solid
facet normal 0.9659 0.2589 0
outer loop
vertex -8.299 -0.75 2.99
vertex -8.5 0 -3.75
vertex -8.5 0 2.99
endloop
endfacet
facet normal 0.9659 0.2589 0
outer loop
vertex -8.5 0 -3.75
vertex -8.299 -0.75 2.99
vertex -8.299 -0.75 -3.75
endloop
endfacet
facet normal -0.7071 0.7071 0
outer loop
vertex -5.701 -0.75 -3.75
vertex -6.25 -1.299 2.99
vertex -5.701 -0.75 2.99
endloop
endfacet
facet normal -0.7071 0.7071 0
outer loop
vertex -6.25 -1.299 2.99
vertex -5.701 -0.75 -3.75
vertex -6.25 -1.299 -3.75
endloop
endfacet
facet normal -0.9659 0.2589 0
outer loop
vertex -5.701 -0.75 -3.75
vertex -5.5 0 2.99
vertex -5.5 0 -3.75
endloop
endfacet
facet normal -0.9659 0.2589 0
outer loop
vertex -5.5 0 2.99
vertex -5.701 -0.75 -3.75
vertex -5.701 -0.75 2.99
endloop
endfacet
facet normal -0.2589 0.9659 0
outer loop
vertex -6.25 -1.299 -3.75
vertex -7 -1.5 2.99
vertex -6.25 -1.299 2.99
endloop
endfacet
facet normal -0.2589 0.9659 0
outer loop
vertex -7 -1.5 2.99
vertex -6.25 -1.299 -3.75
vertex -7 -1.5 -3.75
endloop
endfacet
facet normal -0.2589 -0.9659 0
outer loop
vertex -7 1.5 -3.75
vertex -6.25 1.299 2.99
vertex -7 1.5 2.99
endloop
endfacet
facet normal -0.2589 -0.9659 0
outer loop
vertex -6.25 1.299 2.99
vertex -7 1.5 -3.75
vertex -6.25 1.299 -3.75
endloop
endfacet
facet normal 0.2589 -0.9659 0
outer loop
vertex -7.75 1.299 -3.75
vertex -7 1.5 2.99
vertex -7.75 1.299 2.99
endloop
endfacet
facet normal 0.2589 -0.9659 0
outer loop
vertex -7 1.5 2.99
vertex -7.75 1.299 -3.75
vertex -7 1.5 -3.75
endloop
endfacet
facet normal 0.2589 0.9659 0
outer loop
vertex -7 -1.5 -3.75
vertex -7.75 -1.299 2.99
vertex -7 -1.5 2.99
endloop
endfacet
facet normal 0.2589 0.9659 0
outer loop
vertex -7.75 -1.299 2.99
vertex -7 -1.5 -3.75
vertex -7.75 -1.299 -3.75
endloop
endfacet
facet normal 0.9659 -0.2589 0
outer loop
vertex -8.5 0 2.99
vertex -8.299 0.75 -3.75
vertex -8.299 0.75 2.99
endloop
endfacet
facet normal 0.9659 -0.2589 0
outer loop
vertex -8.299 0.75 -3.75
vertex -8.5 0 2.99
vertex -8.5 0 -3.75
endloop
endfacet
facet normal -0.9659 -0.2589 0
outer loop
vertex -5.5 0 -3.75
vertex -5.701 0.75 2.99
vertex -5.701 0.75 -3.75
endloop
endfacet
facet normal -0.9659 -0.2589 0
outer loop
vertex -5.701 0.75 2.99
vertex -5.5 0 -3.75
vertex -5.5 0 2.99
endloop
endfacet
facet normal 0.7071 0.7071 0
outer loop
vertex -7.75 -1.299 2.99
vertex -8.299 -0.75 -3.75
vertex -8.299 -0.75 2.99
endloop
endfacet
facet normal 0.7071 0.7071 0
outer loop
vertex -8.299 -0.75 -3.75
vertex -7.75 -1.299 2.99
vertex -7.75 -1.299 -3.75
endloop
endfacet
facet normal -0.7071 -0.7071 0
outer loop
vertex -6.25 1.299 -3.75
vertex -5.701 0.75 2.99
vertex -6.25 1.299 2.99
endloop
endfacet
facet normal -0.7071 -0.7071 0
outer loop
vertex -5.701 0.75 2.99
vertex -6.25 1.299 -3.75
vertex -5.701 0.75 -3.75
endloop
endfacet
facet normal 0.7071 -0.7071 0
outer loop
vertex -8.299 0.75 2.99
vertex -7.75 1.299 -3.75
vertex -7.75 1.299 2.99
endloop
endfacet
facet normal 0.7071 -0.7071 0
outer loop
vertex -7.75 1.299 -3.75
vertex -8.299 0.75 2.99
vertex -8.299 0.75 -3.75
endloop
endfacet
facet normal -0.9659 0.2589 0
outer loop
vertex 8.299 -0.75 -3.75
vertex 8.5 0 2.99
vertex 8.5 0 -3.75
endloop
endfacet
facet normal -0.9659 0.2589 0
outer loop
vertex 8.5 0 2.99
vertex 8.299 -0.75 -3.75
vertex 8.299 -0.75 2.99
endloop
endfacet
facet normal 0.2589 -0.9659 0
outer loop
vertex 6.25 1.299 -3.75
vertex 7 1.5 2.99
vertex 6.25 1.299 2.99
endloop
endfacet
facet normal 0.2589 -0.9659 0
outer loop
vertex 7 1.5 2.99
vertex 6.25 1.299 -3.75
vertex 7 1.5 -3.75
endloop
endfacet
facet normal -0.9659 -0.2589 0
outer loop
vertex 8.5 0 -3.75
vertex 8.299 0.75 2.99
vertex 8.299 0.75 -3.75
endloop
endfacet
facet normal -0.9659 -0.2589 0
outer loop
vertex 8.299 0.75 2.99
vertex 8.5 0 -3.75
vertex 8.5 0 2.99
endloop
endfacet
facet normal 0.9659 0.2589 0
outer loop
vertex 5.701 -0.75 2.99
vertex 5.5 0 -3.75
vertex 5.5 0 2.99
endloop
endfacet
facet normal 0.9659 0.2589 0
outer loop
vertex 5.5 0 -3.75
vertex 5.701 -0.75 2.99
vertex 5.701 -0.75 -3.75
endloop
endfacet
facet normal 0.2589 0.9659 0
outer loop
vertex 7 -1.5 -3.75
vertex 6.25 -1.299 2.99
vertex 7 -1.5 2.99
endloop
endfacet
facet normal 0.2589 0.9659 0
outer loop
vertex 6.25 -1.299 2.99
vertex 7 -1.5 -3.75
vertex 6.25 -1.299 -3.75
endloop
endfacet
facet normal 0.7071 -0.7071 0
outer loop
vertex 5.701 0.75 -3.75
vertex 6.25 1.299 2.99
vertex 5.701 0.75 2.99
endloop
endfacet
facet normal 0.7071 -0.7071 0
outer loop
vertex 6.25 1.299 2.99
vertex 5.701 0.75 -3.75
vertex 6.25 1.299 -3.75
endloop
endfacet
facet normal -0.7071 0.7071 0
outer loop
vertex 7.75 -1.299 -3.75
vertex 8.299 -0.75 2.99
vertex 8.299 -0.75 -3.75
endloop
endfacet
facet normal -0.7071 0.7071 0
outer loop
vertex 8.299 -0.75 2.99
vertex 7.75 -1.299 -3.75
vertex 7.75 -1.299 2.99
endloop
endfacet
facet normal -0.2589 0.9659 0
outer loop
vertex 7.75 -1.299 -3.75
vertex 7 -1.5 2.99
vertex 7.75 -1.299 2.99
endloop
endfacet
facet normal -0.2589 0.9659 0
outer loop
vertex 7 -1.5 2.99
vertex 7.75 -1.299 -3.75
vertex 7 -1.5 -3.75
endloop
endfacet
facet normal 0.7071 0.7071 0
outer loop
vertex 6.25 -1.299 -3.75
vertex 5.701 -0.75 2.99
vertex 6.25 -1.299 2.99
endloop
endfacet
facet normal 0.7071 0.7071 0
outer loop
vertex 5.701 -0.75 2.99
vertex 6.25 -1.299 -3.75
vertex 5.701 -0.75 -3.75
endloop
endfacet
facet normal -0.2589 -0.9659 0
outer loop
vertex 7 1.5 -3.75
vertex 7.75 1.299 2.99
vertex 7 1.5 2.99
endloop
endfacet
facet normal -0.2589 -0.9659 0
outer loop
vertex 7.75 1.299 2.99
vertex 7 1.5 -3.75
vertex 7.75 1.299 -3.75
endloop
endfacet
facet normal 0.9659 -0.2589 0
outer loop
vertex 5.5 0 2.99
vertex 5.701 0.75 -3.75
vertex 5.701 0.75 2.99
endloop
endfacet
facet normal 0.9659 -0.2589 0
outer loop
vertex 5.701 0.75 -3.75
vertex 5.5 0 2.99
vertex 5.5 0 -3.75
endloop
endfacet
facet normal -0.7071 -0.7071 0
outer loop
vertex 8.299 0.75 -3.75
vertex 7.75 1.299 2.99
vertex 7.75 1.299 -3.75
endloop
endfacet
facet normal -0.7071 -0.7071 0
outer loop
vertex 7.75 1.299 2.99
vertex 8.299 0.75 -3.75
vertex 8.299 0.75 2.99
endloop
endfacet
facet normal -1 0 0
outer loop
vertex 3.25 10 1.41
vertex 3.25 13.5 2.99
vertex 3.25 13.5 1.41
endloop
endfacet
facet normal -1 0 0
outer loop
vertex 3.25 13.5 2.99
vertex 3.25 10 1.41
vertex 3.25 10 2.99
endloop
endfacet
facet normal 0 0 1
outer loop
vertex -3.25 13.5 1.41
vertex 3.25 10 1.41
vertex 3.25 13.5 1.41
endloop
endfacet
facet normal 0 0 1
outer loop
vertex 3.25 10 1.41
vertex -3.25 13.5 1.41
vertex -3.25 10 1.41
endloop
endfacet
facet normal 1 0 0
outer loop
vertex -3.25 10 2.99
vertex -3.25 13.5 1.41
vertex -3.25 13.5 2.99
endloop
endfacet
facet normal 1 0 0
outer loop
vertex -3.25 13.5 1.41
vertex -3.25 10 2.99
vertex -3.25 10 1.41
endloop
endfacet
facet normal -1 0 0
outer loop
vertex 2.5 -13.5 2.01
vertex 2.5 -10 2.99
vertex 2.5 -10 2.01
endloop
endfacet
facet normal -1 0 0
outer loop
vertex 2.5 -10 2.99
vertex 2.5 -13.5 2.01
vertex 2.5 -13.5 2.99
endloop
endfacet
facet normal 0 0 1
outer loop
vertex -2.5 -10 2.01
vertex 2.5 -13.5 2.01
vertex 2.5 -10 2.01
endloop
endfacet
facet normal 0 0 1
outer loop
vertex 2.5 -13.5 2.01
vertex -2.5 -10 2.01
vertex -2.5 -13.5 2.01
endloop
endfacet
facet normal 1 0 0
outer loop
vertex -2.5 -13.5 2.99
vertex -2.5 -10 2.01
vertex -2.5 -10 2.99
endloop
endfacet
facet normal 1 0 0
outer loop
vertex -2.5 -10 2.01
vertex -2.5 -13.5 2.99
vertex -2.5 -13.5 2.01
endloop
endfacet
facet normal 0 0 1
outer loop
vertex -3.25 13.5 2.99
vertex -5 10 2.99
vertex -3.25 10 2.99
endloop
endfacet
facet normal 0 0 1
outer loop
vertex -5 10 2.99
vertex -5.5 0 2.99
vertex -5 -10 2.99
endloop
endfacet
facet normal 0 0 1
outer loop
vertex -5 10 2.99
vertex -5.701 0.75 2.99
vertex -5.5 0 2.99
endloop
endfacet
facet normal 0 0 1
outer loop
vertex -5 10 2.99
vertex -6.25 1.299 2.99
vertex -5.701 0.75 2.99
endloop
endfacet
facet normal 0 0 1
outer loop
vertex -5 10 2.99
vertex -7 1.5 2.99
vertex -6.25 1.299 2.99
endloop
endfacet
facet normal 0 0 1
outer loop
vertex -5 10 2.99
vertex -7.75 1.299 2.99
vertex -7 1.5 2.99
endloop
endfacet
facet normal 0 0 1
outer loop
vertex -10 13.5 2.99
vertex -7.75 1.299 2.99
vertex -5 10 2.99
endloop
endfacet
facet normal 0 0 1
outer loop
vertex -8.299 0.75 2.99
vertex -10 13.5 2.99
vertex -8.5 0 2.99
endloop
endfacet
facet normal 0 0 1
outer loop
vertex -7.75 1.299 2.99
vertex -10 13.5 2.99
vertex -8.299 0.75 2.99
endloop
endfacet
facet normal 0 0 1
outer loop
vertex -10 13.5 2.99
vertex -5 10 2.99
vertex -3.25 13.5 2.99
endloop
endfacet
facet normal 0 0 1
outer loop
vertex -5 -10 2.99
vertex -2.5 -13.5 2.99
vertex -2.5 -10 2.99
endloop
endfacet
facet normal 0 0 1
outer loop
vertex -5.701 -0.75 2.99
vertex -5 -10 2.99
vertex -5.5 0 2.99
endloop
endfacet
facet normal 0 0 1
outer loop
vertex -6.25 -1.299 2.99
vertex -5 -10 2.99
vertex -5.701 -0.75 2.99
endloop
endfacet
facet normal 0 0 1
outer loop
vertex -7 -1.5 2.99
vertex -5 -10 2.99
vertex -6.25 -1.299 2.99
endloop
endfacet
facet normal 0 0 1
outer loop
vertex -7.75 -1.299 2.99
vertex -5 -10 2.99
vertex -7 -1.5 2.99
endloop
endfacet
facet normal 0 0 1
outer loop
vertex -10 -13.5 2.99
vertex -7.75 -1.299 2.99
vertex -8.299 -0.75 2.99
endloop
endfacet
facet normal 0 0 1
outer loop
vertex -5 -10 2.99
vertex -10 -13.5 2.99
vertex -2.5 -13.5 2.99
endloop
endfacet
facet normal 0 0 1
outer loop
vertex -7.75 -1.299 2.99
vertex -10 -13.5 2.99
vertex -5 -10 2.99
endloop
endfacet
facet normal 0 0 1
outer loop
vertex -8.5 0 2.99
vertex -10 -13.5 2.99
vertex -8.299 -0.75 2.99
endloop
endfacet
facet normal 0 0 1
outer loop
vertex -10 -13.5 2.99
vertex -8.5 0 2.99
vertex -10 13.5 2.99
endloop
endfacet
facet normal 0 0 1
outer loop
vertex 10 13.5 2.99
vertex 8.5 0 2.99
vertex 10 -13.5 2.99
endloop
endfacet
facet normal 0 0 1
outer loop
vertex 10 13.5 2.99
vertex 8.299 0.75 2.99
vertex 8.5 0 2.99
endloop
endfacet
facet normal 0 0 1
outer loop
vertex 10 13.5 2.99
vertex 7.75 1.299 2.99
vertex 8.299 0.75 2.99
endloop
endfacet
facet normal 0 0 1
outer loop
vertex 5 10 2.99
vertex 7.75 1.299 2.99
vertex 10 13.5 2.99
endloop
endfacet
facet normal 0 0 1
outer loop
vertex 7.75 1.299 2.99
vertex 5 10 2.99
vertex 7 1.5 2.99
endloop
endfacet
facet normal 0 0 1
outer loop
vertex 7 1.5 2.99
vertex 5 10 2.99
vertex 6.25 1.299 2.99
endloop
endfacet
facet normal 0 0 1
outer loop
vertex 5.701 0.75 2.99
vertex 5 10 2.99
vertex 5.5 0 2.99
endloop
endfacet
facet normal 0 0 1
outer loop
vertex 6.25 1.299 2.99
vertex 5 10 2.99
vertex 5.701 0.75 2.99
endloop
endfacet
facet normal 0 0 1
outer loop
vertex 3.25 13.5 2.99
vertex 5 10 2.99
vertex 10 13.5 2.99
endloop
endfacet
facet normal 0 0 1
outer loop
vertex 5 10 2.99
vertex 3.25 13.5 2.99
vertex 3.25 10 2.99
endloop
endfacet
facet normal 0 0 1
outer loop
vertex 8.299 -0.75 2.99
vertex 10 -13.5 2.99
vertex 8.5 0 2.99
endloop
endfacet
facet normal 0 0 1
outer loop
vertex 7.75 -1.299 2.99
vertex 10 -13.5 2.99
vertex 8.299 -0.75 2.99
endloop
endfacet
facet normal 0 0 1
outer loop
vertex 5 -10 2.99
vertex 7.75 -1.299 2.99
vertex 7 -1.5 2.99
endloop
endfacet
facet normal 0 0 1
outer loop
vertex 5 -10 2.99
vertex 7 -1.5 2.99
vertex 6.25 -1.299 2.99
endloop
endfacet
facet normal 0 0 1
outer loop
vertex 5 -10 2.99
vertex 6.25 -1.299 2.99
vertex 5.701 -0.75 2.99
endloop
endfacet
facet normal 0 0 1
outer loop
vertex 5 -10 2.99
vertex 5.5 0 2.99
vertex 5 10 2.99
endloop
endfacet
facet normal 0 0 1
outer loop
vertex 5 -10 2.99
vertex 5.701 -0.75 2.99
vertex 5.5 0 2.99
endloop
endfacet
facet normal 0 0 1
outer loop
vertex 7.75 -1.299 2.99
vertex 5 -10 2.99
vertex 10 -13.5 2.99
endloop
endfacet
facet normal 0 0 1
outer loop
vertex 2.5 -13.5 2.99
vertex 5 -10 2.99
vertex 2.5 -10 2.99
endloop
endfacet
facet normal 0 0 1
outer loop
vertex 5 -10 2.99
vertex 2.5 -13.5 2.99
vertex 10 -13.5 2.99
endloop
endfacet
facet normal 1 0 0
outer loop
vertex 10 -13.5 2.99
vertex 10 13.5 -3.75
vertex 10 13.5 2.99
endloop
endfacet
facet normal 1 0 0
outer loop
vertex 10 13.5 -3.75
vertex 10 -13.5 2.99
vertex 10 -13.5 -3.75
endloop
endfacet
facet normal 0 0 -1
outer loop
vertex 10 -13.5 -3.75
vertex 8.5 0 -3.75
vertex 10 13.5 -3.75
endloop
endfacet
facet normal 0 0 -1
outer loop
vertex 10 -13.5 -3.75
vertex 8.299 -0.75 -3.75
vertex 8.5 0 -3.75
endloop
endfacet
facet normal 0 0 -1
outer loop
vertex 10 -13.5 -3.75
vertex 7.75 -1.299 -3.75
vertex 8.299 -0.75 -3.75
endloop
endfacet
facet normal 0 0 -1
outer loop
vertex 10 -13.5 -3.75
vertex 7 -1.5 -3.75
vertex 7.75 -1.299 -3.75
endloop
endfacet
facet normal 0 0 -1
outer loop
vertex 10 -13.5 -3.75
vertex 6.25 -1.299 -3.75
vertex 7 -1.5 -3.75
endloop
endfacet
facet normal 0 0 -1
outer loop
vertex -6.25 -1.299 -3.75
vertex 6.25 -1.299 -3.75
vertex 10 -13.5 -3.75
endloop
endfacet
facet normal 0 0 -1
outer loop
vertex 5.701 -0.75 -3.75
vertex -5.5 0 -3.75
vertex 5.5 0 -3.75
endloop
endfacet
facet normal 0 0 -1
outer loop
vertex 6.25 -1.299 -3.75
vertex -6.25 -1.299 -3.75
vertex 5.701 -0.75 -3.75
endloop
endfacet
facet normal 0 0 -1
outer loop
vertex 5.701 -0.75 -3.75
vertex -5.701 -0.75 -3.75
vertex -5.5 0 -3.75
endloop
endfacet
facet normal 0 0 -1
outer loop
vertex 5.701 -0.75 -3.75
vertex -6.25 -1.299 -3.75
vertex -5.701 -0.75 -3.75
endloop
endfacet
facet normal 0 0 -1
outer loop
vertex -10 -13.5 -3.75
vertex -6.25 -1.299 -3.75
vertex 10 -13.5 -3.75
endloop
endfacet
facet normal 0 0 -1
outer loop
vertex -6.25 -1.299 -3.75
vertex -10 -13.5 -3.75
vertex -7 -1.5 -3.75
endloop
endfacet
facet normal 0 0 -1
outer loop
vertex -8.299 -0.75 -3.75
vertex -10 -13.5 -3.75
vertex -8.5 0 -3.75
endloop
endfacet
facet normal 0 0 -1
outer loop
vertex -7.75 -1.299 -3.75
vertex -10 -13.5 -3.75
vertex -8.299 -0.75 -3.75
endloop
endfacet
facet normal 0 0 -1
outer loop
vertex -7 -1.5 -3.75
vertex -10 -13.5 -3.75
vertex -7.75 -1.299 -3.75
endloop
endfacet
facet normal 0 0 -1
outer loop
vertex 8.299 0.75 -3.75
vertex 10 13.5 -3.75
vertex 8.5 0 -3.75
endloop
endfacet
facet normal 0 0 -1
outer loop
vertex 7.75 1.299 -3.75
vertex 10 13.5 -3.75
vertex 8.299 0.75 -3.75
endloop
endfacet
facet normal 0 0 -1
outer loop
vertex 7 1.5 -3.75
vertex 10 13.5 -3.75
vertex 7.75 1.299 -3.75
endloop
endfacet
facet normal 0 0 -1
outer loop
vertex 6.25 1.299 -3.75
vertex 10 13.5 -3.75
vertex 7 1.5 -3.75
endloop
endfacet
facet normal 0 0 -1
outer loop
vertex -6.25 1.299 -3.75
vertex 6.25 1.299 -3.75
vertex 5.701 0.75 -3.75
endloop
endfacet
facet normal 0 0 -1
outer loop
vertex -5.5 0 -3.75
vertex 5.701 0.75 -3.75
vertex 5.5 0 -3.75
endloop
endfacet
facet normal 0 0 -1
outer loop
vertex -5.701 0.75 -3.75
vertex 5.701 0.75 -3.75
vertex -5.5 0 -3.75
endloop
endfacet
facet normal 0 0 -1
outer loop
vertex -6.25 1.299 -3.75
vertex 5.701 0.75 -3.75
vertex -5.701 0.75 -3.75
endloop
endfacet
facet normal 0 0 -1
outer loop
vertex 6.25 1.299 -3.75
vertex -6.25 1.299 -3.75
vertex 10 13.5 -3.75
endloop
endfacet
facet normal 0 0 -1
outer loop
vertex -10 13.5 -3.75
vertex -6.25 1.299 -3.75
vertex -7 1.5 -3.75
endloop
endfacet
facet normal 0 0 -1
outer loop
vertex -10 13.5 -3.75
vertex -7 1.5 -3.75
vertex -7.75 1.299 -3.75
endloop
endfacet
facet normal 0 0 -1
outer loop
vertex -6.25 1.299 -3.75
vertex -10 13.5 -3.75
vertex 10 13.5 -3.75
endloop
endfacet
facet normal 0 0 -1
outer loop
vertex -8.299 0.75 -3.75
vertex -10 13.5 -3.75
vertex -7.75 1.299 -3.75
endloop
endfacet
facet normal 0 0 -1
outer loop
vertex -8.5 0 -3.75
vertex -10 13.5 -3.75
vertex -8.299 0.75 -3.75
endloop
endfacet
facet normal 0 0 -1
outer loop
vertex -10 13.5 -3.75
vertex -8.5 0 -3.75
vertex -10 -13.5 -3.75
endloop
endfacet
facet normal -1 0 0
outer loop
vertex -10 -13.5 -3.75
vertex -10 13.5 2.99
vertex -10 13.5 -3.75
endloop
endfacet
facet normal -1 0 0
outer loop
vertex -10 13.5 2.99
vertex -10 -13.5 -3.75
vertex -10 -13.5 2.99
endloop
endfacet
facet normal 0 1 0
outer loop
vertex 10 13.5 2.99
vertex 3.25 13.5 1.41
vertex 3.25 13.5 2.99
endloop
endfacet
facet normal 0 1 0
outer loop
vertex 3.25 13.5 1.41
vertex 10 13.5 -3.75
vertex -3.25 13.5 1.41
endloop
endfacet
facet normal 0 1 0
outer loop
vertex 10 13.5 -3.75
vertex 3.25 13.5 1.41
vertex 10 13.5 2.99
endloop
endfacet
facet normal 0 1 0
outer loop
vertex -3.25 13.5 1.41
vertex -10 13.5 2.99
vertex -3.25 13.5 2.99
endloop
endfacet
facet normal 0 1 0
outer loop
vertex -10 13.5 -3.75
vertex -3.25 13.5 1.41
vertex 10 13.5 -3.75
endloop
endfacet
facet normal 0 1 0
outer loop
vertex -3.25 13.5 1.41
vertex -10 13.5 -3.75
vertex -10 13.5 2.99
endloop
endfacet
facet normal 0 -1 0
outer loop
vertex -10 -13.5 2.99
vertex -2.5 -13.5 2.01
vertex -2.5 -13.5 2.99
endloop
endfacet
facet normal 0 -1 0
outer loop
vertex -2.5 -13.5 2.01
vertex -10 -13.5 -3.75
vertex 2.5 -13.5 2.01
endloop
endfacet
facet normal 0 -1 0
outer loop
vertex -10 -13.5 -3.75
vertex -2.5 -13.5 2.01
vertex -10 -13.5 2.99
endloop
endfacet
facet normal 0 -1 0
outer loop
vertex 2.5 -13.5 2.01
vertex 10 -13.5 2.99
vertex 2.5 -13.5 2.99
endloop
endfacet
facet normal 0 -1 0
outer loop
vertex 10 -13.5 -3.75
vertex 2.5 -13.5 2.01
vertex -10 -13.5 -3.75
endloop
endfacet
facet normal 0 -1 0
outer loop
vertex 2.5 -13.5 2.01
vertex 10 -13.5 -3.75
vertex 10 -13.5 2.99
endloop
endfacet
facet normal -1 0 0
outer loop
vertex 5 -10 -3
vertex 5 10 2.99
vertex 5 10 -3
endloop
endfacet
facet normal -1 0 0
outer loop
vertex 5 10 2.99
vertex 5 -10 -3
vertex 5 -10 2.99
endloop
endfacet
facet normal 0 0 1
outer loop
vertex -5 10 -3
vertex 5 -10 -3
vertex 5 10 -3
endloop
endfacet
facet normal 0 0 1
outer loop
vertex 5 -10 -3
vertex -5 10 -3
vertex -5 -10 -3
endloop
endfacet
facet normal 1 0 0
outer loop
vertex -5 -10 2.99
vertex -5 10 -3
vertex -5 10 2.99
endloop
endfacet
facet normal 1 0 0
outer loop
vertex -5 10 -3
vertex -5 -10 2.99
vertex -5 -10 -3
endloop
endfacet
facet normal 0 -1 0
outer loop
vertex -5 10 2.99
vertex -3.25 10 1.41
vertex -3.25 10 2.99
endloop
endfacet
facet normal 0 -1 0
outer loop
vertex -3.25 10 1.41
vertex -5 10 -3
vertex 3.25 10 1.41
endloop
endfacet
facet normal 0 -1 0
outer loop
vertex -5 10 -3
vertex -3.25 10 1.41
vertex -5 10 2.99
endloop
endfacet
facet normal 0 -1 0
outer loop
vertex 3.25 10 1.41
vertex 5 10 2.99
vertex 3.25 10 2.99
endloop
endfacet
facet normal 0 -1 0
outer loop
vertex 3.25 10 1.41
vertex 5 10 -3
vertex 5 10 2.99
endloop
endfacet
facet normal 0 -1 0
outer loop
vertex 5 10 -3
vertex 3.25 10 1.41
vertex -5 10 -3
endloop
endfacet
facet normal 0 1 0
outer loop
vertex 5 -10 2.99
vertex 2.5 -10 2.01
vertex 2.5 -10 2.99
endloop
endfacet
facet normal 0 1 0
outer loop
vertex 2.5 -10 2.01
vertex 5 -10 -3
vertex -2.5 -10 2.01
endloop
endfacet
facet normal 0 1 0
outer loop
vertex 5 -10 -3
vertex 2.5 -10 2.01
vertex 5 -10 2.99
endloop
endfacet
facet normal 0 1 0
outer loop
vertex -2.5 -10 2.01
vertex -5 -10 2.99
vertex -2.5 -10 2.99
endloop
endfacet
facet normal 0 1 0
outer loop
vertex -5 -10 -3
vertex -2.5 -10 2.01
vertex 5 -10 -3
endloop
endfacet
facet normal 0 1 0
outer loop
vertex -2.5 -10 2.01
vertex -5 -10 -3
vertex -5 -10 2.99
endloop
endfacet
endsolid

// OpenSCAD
// mechanical protection
// for motor connector and improvised cable plug

module connector_hole()
{
  cube([10,20,6],center=true);
}

module connector_holder()
{
  cube([20,27,7.5],center=true);
}

module motor_wire_space()
{
  translate([0,11,0])
  cube([6.5,10,1.6],center=true);
}

module board_wire_space()
{
  translate([0,-11,0])
  cube([5,10,1.0],center=true);
}

module screw_in()
{
  for(i = [-1,1])
    translate([14/2*i,0,-0.01])
      cylinder(d=1.8,h=3,$fn=12);
}

module screw_thru()
{
  for(i = [-1,1])
    translate([14/2*i,0,0.01])
      rotate([180,0,0])
        cylinder(d=3,h=10,$fn=12);
}

module motor_wire_holder(half=1)
{
  difference()
  {
    connector_holder();
    connector_hole();
    if(half == 0) // for flat surface
    {
      translate([0,0,3-0.8+0.01])
      motor_wire_space();
      translate([0,0,3-0.5+0.01])
      board_wire_space();
      translate([0,0,3])
      screw_thru();  
      translate([0,0,50+3-0.01])
        cube([50,50,100],center=true);
    }
    else // standalone
    {
      motor_wire_space();
      board_wire_space();
      screw_in();
      screw_thru();
      translate([0,0,-50*half])
        cube([50,50,100],center=true);
    }
  }
}

if(0)
translate([-15,0,0])
motor_wire_holder(half=-1);
rotate([0,180,0])
if(0)
translate([-15,0,0])
motor_wire_holder(half=1);
if(1)
  motor_wire_holder(half=0);
  
